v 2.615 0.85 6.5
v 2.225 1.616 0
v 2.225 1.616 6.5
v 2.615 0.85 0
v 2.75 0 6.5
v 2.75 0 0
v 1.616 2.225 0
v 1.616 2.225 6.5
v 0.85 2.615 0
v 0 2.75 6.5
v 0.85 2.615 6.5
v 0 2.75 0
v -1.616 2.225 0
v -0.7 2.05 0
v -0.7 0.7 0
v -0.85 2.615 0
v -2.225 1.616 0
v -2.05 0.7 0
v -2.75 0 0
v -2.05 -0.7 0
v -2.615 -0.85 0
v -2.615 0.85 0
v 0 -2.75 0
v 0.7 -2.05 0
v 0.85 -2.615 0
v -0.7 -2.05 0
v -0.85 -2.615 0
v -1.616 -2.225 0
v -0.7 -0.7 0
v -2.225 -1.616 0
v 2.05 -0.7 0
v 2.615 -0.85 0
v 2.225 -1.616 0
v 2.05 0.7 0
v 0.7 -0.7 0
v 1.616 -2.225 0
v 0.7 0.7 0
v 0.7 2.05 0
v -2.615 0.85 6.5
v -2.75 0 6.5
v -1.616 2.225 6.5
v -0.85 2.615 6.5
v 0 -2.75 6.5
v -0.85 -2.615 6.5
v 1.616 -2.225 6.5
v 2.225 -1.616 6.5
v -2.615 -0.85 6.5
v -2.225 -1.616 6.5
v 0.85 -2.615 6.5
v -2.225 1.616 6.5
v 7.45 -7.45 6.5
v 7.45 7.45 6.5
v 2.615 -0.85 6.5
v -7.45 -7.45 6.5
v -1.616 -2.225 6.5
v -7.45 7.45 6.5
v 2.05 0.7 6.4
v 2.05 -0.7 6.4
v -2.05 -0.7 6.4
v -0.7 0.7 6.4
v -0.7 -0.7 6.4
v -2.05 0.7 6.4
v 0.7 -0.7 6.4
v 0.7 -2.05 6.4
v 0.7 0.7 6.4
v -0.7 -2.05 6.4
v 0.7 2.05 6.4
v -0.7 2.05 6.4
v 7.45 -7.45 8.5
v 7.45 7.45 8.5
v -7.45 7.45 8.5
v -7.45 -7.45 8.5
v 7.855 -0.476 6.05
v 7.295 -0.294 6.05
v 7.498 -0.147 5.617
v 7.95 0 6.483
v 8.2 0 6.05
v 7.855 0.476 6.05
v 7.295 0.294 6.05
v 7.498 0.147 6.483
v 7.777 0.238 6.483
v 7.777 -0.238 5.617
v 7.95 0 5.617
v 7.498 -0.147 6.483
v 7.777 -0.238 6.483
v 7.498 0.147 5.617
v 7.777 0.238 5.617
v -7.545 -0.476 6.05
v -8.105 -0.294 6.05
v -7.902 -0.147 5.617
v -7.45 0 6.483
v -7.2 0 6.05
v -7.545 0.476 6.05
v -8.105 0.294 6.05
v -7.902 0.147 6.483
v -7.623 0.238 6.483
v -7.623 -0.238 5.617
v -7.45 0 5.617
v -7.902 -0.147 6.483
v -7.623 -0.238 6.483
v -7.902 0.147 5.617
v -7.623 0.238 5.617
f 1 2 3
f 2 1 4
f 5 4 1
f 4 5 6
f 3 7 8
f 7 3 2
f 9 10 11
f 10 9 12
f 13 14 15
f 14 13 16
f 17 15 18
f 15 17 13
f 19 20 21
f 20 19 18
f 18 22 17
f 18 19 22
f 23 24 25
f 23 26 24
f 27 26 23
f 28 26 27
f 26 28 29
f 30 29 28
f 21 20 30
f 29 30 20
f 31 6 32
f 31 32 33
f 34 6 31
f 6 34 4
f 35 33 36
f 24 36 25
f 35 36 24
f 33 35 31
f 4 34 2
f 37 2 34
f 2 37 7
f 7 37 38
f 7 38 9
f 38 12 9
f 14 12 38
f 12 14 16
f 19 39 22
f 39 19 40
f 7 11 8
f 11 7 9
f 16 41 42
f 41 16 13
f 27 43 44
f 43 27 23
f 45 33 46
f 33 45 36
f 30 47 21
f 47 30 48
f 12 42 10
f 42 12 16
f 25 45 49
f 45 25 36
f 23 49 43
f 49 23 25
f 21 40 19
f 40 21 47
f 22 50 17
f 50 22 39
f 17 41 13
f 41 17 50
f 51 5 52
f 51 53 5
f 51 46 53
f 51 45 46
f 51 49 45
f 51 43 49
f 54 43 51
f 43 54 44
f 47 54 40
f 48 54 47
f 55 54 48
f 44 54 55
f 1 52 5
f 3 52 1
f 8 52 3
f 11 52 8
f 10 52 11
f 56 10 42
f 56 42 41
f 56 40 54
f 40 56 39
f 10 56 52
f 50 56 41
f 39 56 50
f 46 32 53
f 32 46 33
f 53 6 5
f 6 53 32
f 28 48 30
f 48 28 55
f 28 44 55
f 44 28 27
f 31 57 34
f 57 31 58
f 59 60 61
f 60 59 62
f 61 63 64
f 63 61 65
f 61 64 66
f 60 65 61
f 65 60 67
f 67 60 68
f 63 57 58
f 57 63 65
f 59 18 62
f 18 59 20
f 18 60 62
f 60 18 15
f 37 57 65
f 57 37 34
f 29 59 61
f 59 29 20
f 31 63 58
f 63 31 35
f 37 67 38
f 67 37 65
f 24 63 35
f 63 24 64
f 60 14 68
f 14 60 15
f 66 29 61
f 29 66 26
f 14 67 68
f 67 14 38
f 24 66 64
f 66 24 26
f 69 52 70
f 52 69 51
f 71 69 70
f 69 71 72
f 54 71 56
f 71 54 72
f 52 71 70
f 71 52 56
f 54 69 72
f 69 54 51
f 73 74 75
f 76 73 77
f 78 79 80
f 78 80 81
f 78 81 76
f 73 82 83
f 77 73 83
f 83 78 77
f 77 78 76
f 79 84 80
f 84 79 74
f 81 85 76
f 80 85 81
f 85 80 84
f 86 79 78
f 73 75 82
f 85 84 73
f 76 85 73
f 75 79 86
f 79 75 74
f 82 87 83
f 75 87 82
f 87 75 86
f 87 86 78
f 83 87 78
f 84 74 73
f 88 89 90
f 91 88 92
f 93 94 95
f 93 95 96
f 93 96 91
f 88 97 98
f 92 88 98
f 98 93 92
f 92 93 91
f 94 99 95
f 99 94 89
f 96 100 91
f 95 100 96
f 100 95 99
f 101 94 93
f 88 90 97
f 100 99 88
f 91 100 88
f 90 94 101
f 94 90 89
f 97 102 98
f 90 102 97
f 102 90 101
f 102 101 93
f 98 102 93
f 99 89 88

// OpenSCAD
// !!! Enable "Thrown Together" view, to see inner sides in purple colour

concaveWidth = 12;
edgeHeight = 1.5;
fullWidth = 17;
halfWidth = fullWidth/2;
edgeLength = 10;
bevel = 0.5;
halfWidthLessBevel = halfWidth-bevel;
frontHeight = 5;
wallThickness = 2;
pegTopThickness = 2;
echo(halfWidth-bevel);

stemDiameter=5.5;
stemHeight = 6.5;
slotLength = 4.1;
slotWidth = 1.4;
slots = [[slotLength,slotWidth, stemHeight], [slotWidth,slotLength, stemHeight]];

showBoth = true;
showStem = true;

points = [
    // Concave
    [-concaveWidth/2,   7,    1], // concaveFarLeft=0
    [ concaveWidth/2,   7,    1], // concaveFarRight=1
    [-concaveWidth/2,  -7,    1], // concaveNearLeft=2
    [ concaveWidth/2,  -7,    1], // concaveNearRight=3
    
    // Bottom
    [-halfWidth,   halfWidthLessBevel,            0], // bottomFarLeftNear=4
    [-halfWidthLessBevel,             halfWidth,  0], // bottomFarLeftFar=5
    [ halfWidthLessBevel,             halfWidth,  0], // bottomFarRightFar=6
    [ halfWidth,   halfWidthLessBevel,            0], // bottomFarRightNear=7
    [ halfWidth,  -halfWidthLessBevel,            0], // bottomNearRightFar=8
    [ halfWidthLessBevel,            -halfWidth,  0], // bottomNearRightNear=9
    [-halfWidthLessBevel,            -halfWidth,  0], // bottomNearLeftNear=10
    [-halfWidth,  -halfWidthLessBevel,            0], // bottomNearLeftFar=11
    
    // Left Side
    [-halfWidthLessBevel, edgeLength/2,  edgeHeight], // sideFarLeftTop=12
    [-halfWidthLessBevel, -edgeLength/2, edgeHeight], // sideNearLeftTop=13
    
    // Right Side
    [halfWidthLessBevel,  edgeLength/2, edgeHeight], // sideFarRightTop=14
    [halfWidthLessBevel, -edgeLength/2, edgeHeight], // sideNearRightTop=15
    
    // Left Top Edge
    [-7.5, edgeLength/2,  edgeHeight], // leftTopEdgeFar=16
    [-7.5, -edgeLength/2, edgeHeight], // leftTopEdgeNear=17
    
    // Right Top Edge
    [7.5, edgeLength/2,  edgeHeight], // rightTopEdgeFar=18
    [7.5, -edgeLength/2, edgeHeight], // rightTopEdgeNear=19
    
    [ halfWidth,  -halfWidthLessBevel,            -frontHeight], // frontNearRightFar=20
    [ halfWidthLessBevel,            -halfWidth,  -frontHeight], // frontNearRightNear=21
    [-halfWidthLessBevel,            -halfWidth,  -frontHeight], // frontNearLeftNear=22
    [-halfWidth,  -halfWidthLessBevel,            -frontHeight], // frontNearLeftFar=23
    
    [-halfWidth,   halfWidthLessBevel,            -1], // backFarLeftNear=24
    [-halfWidthLessBevel,             halfWidth,  -1], // backFarLeftFar=25
    [ halfWidthLessBevel,             halfWidth,  -1], // backFarRightFar=26
    [ halfWidth,   halfWidthLessBevel,            -1], // backFarRightNear=27
];

concaveFarLeft = 0;
concaveFarRight = 1;
concaveNearLeft = 2;
concaveNearRight = 3;

bottomFarLeftNear=4;
bottomFarLeftFar=5;
bottomFarRightFar=6;
bottomFarRightNear=7;
bottomNearRightFar=8;
bottomNearRightNear=9;
bottomNearLeftNear=10;
bottomNearLeftFar=11;

sideFarLeftTop=12;
sideNearLeftTop=13;
    
sideFarRightTop=14;
sideNearRightTop=15;

leftTopEdgeFar=16;
leftTopEdgeNear=17;

rightTopEdgeFar=18;
rightTopEdgeNear=19;

frontNearRightFar=20;
frontNearRightNear=21;
frontNearLeftNear=22;
frontNearLeftFar=23;

backFarLeftNear=24;
backFarLeftFar=25;
backFarRightFar=26;
backFarRightNear=27;

faces = [
    [concaveFarLeft, concaveFarRight, concaveNearRight, concaveNearLeft], // Concave plate
    [backFarRightNear, backFarRightFar, backFarLeftFar, backFarLeftNear, frontNearLeftFar, frontNearLeftNear, frontNearRightNear, frontNearRightFar], // Bottom plate
    // [bottomFarRightFar, bottomFarLeftFar, frontNearLeftNear]
    [bottomFarRightFar, concaveFarRight, concaveFarLeft, bottomFarLeftFar], // Rear bevel plate 
    [sideNearRightTop, sideFarRightTop, bottomFarRightNear, bottomNearRightFar], // Right bevel plate 
    [sideFarLeftTop, sideNearLeftTop, bottomNearLeftFar, bottomFarLeftNear], // Left bevel plate
    [bottomNearLeftNear, concaveNearLeft, concaveNearRight, bottomNearRightNear], // Front bevel plate
    [sideFarLeftTop, leftTopEdgeFar, leftTopEdgeNear, sideNearLeftTop], // Left Top Edge
    [rightTopEdgeFar, sideFarRightTop, sideNearRightTop, rightTopEdgeNear], // Right Top Edge
    [rightTopEdgeNear, sideNearRightTop, bottomNearRightNear], // Right Near Edge 1
    [sideNearRightTop, bottomNearRightFar, bottomNearRightNear], // Right Near Edge 2
    [concaveNearRight, rightTopEdgeNear, bottomNearRightNear], // Right Near Edge 3
    [concaveFarRight, rightTopEdgeFar, rightTopEdgeNear, concaveNearRight], // Right concave to edge
    [bottomFarRightNear, sideFarRightTop, bottomFarRightFar], //Right Far Edge 1
    [sideFarRightTop, rightTopEdgeFar, bottomFarRightFar], //Right Far Edge 2
    [concaveFarRight, bottomFarRightFar, rightTopEdgeFar], // Right Far Edge 3
    [concaveNearLeft, leftTopEdgeNear, leftTopEdgeFar, concaveFarLeft], // left concave to edge
    [bottomNearLeftNear, sideNearLeftTop, leftTopEdgeNear], // Left Near Edge 1
    [sideNearLeftTop, bottomNearLeftNear, bottomNearLeftFar], // Left far edge 2
    [leftTopEdgeNear, concaveNearLeft, bottomNearLeftNear], // Left far edge 3
    [bottomFarLeftFar, concaveFarLeft, leftTopEdgeFar], // Left Far Edge 1
    [leftTopEdgeFar, sideFarLeftTop, bottomFarLeftFar], // Left Far Edge 2
    [bottomFarLeftFar, sideFarLeftTop, bottomFarLeftNear], // Left Far Edge 3
    [bottomNearLeftNear, bottomNearRightNear, frontNearRightNear, frontNearLeftNear], // Front
    [bottomNearRightNear, bottomNearRightFar, frontNearRightFar, frontNearRightNear], // Right Front edge
    [bottomNearLeftFar, bottomNearLeftNear, frontNearLeftNear, frontNearLeftFar], // Left Frot Edge
    [bottomNearRightFar, bottomFarRightNear, backFarRightNear, frontNearRightFar], // Right Side
    [bottomFarLeftNear, bottomNearLeftFar, frontNearLeftFar, backFarLeftNear], // Left Side
    [bottomFarRightNear, bottomFarRightFar, backFarRightFar, backFarRightNear], // Right Back Edge
    [bottomFarLeftFar, bottomFarLeftNear, backFarLeftNear, backFarLeftFar], // Left Back Edge
    [bottomFarRightFar, bottomFarLeftFar, backFarLeftFar, backFarRightFar], // Back
];

if (showBoth) {
    stem();
    translate([0,0, stemHeight/2]) cap();
} else if (showStem) {
    stem();
} else {
    cap();
}

module stem() {
    translate([0,0, stemHeight+(pegTopThickness/2)]) cube([fullWidth-wallThickness-0.1, fullWidth-wallThickness-0.1, pegTopThickness], center=true);
    // stem
    difference() {
        cylinder(stemHeight, d=stemDiameter, $fn=20);
        translate([0,0, stemHeight/2-0.1]) cube(slots[0], center=true);
        translate([0,0, stemHeight/2-0.1]) cube(slots[1], center=true);
    }
}

// translate([fullWidth/2-2, 0, frontHeight-2]) cube([2,2,2]);
module cap() {
    color("grey") translate([0, 0, frontHeight]) difference() {
        polyhedron( points, faces);
        translate([0, 0, -(frontHeight/2)])
            cube([fullWidth-wallThickness, fullWidth-wallThickness, frontHeight], center=true);
    }
    translate([fullWidth/2-0.8, 0, frontHeight-pegTopThickness-0.2]) sphere(d=1);
    translate([-fullWidth/2+0.8, 0, frontHeight-pegTopThickness-0.2]) sphere(d=1);
}
